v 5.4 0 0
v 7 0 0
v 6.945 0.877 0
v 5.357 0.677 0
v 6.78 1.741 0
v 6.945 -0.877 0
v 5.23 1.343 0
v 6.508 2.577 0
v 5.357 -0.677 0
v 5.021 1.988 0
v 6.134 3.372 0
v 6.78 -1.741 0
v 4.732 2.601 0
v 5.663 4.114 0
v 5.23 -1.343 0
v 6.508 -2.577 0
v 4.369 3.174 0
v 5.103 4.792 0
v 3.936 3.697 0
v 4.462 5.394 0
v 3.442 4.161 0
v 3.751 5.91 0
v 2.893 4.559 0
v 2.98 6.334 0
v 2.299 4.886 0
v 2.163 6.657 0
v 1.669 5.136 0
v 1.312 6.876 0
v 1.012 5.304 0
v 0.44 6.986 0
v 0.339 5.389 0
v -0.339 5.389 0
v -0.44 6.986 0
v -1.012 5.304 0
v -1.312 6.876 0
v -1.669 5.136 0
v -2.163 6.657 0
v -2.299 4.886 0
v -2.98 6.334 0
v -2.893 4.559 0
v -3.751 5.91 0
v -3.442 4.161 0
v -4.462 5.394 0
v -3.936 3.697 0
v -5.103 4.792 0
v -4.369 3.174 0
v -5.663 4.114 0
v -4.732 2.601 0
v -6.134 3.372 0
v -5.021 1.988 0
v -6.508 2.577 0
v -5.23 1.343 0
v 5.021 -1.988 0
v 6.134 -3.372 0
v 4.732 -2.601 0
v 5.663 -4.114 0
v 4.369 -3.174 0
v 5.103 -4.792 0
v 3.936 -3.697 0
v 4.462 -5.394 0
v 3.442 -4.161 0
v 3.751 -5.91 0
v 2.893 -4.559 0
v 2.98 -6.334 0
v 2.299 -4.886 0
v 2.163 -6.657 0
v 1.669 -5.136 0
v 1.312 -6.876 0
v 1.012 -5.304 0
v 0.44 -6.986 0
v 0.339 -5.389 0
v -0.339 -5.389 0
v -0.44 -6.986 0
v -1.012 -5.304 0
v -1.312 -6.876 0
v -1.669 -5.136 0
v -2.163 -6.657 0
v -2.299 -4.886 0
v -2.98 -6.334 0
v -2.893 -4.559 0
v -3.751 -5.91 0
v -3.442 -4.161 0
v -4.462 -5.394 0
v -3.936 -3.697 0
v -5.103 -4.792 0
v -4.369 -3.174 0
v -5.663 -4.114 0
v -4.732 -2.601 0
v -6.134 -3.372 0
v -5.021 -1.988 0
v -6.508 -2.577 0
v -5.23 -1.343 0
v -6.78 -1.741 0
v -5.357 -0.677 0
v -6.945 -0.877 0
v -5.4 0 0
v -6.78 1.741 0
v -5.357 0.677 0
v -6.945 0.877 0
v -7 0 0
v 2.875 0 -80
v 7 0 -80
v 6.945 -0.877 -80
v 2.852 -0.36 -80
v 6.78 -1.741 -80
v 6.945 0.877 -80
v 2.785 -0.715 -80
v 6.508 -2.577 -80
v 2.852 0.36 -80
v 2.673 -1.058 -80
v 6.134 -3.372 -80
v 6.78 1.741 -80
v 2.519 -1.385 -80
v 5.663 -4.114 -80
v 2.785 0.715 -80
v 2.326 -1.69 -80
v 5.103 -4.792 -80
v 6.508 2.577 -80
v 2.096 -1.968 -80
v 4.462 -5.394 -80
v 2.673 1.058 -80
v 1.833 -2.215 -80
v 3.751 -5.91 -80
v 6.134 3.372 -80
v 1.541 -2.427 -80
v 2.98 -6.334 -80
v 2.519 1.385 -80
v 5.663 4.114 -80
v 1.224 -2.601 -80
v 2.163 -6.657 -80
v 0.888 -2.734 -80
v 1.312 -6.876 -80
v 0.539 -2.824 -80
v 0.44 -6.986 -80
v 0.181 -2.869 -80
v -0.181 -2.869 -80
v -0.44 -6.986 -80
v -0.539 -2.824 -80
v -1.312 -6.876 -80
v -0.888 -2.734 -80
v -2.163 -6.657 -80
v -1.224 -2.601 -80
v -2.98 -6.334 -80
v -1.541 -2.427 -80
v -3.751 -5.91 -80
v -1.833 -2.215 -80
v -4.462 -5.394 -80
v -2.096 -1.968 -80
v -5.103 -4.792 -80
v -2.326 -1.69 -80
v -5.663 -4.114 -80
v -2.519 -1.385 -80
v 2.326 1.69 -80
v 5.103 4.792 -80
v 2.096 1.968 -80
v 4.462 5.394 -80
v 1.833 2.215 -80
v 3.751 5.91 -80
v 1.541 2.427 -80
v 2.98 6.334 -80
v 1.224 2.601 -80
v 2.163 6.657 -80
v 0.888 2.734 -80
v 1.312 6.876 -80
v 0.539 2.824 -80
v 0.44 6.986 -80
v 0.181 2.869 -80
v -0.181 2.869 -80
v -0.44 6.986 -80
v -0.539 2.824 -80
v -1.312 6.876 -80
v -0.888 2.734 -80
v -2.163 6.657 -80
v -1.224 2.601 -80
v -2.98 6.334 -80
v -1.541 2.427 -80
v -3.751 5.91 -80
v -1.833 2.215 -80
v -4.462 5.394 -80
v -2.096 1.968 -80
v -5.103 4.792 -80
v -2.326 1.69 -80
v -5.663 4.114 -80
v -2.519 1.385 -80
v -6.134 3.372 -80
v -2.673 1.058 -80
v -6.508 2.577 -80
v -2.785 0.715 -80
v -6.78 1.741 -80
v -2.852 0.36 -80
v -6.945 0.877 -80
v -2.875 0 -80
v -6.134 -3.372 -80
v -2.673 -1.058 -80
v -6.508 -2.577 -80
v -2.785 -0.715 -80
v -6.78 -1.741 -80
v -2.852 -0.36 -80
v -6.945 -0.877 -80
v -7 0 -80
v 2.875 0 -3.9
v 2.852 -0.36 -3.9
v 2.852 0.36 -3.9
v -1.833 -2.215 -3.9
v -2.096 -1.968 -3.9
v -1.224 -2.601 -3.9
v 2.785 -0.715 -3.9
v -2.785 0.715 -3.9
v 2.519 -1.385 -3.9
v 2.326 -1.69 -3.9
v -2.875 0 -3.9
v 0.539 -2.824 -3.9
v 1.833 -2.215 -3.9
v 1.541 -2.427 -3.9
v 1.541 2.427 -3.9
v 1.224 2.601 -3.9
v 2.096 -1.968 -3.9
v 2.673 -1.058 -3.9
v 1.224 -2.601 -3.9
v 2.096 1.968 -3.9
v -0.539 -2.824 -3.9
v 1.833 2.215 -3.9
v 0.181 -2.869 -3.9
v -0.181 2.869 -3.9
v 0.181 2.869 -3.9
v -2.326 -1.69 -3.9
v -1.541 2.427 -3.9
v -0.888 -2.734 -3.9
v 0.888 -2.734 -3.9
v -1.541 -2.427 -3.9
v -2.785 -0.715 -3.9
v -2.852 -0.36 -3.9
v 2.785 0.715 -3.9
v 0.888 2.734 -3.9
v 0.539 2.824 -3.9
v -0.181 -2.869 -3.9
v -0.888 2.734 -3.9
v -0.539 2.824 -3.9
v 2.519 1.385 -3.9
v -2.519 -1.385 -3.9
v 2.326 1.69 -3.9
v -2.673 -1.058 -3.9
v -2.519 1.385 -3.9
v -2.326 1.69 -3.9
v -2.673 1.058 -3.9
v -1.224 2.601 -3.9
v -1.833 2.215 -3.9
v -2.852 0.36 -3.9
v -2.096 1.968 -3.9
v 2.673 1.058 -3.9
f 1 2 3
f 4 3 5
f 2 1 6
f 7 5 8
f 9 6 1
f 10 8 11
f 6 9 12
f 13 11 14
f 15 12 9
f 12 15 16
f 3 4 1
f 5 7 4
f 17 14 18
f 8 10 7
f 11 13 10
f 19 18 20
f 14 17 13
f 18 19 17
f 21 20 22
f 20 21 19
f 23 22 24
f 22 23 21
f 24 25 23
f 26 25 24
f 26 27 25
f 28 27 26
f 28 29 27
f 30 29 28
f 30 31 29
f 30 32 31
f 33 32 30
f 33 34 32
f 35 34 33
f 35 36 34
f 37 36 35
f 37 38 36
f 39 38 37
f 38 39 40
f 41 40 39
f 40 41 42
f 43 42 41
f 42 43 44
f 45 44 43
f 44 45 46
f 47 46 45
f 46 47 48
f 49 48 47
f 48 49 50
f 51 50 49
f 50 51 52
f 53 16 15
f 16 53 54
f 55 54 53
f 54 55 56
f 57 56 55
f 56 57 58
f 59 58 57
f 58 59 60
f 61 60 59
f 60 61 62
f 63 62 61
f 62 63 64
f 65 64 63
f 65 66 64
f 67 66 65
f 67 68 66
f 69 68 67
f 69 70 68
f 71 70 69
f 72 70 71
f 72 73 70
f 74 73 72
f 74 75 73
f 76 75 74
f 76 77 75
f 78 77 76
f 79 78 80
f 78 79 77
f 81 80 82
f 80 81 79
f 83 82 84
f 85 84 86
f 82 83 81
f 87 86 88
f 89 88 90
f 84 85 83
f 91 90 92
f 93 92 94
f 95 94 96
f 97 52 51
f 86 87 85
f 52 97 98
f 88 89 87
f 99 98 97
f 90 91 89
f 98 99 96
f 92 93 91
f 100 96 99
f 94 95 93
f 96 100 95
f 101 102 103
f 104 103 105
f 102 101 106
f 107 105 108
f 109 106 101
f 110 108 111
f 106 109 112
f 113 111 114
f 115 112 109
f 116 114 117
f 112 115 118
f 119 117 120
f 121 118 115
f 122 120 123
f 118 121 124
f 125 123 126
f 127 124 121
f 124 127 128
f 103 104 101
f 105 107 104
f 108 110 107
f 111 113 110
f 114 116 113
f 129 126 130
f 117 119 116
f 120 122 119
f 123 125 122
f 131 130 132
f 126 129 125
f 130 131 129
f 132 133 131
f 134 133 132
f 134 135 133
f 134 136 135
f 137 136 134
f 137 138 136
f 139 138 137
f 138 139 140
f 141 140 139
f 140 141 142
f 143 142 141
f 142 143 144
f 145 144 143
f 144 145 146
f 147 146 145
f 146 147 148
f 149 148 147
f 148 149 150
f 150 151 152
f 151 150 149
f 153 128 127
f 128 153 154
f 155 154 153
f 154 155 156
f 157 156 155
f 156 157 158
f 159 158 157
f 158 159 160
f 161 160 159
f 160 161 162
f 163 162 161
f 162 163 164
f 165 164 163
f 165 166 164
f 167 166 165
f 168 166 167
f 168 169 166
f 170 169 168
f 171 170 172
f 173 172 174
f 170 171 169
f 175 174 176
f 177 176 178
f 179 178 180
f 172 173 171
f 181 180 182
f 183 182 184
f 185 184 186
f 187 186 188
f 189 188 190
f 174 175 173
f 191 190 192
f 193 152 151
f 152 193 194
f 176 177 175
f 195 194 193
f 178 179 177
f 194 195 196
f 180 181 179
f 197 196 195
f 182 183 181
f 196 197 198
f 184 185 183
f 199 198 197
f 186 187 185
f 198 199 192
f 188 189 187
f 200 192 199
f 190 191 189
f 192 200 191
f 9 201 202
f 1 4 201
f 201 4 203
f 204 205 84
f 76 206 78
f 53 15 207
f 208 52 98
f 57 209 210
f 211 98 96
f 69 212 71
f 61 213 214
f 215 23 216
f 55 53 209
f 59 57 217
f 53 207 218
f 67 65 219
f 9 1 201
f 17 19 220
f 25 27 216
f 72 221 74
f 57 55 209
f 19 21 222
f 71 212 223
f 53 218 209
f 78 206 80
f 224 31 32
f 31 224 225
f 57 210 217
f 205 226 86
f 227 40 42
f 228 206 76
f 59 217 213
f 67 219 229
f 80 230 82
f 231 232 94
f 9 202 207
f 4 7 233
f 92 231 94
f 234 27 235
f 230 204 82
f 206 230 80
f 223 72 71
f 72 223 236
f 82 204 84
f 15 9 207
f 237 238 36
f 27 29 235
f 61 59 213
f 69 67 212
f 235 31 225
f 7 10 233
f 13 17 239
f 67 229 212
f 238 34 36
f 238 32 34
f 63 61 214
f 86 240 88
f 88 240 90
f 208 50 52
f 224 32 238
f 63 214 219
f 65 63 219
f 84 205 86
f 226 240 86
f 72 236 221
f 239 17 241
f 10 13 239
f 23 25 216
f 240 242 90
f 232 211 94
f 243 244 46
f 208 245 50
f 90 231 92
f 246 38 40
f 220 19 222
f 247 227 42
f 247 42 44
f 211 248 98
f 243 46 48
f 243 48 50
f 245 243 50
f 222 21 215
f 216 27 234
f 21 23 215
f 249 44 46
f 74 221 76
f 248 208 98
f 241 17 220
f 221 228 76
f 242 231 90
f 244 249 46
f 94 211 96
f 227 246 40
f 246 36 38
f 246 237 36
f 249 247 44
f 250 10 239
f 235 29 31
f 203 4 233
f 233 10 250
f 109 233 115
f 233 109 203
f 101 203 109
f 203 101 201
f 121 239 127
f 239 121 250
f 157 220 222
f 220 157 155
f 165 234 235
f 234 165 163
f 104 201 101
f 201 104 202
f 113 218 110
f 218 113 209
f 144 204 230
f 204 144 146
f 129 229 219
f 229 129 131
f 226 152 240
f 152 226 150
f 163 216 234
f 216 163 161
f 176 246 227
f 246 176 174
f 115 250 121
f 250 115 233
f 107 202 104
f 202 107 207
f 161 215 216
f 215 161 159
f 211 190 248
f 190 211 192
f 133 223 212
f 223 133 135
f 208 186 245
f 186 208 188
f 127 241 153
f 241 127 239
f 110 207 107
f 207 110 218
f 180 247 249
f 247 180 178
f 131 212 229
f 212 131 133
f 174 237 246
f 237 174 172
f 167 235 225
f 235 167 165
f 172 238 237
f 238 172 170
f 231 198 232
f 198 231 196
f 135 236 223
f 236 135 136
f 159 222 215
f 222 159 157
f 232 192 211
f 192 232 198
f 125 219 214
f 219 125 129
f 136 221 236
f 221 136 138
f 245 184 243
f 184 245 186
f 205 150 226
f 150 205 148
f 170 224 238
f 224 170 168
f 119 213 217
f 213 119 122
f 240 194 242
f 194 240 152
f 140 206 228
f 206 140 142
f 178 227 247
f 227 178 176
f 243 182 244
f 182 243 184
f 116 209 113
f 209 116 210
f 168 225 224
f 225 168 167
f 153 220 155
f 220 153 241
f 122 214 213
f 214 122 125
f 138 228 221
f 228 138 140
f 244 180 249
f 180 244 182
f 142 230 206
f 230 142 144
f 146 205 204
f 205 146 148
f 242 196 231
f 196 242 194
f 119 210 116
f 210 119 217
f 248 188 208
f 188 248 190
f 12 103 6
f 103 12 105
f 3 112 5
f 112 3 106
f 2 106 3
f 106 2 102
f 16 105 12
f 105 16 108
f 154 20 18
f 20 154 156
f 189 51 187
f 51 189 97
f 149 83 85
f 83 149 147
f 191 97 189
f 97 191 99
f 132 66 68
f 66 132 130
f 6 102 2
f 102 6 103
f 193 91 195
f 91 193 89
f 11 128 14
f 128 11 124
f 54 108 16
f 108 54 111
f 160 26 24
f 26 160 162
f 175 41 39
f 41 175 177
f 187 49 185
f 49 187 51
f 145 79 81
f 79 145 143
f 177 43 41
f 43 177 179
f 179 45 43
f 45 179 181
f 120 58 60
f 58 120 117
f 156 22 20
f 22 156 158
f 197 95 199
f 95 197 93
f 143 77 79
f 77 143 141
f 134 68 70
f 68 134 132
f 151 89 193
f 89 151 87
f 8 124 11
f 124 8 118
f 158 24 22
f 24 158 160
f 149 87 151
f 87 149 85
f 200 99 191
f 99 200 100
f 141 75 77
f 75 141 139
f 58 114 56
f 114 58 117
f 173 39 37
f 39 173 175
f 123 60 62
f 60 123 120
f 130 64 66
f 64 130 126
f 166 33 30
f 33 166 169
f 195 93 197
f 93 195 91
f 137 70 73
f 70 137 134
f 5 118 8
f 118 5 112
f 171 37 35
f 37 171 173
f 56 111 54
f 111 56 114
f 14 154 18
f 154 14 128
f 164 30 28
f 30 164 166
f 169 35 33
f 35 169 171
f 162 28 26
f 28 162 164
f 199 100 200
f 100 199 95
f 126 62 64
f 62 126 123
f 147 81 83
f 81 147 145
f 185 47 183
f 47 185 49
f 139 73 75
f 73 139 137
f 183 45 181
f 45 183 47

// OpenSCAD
$fn = 50;


difference() {
	union() {
		translate(v = [0, 0, -80.0000000000]) {
			cylinder(h = 80, r = 7.0000000000);
		}
	}
	union() {
		translate(v = [0, 0, 0]) {
			rotate(a = [0, 0, 0]) {
				difference() {
					union() {
						#translate(v = [0, 0, -80.0000000000]) {
							cylinder(h = 80, r = 2.6000000000);
						}
						#translate(v = [0, 0, -3.9000000000]) {
							cylinder(h = 3.9000000000, r1 = 2.8750000000, r2 = 5.4000000000);
						}
						#translate(v = [0, 0, -80.0000000000]) {
							cylinder(h = 80, r = 2.8750000000);
						}
						#translate(v = [0, 0, -80.0000000000]) {
							cylinder(h = 80, r = 2.6000000000);
						}
					}
					union();
				}
			}
		}
	}
}
